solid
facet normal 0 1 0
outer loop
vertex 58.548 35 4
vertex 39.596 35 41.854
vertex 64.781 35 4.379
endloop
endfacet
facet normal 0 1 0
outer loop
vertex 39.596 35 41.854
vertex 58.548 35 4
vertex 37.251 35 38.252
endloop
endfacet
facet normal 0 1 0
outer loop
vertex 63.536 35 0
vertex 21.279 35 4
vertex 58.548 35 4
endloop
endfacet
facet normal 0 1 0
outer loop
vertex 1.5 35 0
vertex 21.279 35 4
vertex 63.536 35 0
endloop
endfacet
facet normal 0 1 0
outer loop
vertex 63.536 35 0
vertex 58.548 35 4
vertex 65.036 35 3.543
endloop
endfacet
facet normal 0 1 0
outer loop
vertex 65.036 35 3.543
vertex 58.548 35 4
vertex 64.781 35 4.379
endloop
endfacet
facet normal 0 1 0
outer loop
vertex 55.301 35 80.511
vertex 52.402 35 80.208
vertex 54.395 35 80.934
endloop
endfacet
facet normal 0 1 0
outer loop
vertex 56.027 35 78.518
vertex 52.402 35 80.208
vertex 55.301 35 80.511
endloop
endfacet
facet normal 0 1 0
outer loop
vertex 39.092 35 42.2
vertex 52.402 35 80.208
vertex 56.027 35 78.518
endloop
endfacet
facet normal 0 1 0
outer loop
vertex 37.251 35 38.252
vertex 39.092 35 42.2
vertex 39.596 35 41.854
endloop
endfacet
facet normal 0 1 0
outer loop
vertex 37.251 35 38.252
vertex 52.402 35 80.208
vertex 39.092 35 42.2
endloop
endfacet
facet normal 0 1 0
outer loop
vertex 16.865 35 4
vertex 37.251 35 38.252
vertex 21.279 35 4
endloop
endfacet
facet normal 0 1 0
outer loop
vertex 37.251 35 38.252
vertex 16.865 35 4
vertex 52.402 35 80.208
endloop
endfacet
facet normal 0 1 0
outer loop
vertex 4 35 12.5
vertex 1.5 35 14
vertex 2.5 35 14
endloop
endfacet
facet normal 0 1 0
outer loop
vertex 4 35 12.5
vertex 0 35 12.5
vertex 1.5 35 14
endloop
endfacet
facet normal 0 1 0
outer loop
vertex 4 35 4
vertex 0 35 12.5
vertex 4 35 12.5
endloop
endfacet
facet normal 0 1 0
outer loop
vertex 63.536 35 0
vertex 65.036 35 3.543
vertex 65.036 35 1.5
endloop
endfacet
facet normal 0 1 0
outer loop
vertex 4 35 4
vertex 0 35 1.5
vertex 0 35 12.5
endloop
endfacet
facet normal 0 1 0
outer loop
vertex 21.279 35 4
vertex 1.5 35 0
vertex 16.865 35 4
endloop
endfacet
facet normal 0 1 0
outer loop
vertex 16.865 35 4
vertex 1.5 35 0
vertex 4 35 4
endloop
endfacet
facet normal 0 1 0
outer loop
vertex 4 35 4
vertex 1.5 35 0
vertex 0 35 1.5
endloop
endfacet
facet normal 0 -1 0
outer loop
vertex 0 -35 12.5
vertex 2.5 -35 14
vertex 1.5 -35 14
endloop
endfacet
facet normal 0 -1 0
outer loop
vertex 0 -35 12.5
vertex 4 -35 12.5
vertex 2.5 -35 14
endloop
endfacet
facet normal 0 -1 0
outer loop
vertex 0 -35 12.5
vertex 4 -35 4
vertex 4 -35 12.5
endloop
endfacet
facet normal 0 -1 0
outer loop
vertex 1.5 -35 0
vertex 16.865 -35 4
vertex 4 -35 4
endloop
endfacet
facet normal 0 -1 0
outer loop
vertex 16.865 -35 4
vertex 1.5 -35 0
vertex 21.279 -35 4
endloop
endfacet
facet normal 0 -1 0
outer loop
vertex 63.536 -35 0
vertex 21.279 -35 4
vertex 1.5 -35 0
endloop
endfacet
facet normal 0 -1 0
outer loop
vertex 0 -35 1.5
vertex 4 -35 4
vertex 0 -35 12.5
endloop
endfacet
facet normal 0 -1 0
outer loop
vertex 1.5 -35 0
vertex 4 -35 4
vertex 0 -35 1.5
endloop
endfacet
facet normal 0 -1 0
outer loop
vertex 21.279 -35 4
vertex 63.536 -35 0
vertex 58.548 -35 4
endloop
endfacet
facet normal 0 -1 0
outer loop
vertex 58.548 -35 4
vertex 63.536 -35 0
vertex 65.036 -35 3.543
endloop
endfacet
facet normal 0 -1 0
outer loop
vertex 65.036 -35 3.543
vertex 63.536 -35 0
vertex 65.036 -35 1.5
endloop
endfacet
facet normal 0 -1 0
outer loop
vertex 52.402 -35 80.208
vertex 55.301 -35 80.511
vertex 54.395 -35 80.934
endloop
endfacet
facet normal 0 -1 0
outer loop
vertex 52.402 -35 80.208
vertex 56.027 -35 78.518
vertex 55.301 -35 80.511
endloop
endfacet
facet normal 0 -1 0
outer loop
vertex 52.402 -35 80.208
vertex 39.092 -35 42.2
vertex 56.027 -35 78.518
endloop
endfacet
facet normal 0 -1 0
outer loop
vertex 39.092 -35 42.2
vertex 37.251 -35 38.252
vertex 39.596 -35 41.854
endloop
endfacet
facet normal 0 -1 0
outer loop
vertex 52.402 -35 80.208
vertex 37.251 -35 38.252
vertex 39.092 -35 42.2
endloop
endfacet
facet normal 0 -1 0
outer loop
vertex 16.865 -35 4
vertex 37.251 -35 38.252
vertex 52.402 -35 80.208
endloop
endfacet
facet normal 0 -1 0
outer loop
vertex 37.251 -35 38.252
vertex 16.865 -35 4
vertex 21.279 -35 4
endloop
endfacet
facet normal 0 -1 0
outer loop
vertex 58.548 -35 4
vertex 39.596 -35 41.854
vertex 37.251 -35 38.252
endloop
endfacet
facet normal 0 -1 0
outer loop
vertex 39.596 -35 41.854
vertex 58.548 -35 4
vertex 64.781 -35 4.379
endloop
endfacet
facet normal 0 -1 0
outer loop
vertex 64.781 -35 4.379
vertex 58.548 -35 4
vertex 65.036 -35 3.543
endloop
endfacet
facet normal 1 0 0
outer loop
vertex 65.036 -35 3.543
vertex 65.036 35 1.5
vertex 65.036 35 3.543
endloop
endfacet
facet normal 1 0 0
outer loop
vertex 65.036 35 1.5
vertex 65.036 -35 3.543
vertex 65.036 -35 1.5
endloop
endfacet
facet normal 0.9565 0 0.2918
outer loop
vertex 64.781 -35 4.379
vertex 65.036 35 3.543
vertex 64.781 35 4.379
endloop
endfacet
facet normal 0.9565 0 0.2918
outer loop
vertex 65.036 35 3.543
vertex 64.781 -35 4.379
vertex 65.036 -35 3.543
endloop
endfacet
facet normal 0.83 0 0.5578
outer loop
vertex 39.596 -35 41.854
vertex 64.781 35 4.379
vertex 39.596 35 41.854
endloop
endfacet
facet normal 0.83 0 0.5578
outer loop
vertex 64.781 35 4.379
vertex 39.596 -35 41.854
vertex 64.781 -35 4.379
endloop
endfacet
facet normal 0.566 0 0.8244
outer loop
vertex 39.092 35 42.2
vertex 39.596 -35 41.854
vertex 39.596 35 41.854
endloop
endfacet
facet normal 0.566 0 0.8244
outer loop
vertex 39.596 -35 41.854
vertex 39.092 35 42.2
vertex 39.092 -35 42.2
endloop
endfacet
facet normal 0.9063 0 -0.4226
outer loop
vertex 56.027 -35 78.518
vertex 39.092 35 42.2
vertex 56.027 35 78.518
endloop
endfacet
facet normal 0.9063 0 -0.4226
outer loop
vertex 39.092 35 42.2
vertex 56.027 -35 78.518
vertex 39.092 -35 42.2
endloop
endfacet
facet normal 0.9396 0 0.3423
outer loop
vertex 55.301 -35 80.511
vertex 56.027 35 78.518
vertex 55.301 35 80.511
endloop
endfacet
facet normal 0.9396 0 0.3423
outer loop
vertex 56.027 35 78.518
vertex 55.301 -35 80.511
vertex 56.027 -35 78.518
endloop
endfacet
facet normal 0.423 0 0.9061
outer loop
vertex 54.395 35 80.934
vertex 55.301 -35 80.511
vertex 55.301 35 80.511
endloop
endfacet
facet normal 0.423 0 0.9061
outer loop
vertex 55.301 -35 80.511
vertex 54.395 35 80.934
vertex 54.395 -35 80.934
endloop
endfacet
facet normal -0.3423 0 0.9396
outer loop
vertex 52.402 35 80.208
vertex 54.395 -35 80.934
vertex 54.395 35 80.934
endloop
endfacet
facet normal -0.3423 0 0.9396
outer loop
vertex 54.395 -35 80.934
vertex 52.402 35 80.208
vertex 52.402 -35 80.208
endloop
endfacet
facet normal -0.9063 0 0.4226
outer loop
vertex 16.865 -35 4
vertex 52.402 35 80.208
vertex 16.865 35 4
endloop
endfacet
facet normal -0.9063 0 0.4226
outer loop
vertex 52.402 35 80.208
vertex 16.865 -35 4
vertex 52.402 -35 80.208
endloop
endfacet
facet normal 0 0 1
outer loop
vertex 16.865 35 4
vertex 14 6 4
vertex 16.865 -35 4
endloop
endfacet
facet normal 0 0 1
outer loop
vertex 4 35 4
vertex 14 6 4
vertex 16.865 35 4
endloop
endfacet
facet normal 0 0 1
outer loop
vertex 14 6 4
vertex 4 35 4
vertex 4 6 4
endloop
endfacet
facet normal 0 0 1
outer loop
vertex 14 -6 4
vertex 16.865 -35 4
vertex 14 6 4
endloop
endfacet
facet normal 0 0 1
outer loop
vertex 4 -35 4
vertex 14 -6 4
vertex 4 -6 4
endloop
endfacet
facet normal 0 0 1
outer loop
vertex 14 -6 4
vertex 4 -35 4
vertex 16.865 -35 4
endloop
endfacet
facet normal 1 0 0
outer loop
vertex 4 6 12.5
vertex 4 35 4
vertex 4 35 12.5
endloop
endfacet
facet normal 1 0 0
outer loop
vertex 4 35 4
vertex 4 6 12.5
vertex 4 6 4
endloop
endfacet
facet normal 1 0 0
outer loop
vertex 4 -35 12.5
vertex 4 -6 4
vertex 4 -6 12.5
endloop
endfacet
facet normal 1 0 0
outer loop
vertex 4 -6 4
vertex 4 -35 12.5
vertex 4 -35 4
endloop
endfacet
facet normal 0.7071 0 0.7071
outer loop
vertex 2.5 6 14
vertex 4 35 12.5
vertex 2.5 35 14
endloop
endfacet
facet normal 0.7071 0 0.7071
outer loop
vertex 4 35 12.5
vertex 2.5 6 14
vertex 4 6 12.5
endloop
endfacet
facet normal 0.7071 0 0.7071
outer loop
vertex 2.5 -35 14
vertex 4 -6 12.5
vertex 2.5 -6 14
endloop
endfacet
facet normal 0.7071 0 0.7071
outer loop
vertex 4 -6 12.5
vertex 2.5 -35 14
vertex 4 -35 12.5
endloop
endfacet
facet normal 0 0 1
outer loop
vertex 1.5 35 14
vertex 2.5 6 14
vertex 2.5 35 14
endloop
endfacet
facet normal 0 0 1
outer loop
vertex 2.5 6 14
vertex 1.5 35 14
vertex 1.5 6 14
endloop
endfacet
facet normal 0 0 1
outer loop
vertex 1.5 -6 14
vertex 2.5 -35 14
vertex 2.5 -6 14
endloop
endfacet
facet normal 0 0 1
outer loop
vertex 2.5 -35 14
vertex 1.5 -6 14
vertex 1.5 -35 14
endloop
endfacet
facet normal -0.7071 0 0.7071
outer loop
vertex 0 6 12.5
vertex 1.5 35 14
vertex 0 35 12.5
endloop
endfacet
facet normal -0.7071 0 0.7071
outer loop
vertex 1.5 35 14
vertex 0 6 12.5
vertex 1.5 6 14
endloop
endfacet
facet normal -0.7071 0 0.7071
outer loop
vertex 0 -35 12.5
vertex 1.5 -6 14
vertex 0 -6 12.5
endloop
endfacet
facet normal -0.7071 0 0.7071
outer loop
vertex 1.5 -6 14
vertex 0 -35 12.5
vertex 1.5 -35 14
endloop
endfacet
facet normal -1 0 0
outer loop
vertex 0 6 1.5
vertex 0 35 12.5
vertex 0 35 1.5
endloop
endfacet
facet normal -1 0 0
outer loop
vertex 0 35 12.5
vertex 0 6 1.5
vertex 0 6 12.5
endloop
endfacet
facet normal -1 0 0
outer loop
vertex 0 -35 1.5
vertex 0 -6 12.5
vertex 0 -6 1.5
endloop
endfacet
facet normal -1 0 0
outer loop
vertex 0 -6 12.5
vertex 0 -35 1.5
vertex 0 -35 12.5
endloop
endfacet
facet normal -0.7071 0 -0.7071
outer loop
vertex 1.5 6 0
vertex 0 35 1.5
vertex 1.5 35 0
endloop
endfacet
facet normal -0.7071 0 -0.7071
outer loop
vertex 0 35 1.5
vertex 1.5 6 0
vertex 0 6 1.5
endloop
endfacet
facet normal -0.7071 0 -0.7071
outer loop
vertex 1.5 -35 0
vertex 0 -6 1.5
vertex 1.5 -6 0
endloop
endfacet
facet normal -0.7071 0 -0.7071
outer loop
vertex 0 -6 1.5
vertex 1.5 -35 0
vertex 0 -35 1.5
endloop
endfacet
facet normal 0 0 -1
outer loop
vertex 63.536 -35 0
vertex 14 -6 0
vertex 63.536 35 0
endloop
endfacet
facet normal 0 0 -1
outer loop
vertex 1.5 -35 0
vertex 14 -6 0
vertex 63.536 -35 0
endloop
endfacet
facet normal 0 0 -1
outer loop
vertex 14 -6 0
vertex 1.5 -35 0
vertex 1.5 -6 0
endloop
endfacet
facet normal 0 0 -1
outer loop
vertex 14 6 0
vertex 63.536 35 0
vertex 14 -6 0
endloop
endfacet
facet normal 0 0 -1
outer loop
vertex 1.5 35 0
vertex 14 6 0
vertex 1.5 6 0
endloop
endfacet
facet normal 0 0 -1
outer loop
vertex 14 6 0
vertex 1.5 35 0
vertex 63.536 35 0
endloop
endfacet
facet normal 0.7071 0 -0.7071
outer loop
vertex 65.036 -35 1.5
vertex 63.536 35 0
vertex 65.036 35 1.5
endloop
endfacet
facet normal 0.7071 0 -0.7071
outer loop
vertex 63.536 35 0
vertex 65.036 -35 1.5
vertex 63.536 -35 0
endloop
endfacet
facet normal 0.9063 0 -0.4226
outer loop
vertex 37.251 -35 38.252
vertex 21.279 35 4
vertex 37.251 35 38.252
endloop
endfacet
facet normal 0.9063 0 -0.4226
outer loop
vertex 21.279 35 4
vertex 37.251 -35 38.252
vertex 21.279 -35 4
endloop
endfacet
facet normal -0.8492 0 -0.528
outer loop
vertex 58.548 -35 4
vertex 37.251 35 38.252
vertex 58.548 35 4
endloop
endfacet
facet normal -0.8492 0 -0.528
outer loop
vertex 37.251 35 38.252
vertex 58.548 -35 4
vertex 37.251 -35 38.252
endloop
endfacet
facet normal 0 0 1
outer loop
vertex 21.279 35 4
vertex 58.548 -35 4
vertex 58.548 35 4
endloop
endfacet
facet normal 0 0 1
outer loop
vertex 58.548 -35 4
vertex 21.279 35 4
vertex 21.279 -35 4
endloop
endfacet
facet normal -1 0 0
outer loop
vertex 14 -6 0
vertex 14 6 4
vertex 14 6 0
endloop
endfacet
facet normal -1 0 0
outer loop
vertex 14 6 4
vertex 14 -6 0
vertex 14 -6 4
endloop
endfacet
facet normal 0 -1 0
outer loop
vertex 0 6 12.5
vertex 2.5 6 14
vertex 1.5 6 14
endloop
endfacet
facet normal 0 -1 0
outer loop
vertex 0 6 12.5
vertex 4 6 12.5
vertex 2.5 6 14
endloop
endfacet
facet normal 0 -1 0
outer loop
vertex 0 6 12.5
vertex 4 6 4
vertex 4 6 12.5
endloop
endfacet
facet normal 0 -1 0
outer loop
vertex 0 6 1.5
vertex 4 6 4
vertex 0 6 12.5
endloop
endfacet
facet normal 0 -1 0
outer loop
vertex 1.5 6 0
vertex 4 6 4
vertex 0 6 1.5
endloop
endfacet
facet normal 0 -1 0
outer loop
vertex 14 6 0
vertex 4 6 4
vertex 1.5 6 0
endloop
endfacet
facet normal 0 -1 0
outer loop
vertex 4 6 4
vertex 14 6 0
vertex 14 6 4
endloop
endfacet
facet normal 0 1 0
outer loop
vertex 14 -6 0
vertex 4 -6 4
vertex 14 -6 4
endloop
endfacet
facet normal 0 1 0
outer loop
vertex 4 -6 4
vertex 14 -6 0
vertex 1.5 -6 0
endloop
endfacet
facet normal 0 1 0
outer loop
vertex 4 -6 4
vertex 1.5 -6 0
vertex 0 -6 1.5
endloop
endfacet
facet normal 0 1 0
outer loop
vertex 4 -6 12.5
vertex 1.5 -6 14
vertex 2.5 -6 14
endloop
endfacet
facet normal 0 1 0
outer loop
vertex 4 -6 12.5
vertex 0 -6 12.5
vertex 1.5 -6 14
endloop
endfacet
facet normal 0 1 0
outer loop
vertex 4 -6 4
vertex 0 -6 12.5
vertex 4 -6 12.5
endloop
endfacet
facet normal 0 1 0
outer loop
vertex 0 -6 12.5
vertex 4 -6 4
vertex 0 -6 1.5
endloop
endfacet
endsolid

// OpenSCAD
// Soporte para celular · Laboratorio Ayemi
// Medidas en mm. El Customizer vuelve
// controles los comentarios con [rango].
grosor_cel = 11;  // [6:0.5:16]
ancho = 70;       // [50:5:100]
angulo = 65;      // [50:5:80]
ranura_cable = true;

/* [Hidden] */
pared = 4;
alto = 90;        // largo del respaldo
labio = 14;       // tope del frente
x0 = pared + grosor_cel;
fondo = x0 + alto * cos(angulo) + 12;
ax = x0 + pared + alto * cos(angulo) / 2;
az = alto * sin(angulo) / 2;

module perfil() {
  intersection() {      // nada bajo el piso
    square([fondo, alto]);
    offset(r = 1.5) offset(delta = -1.5) {
      square([fondo, pared]);     // base
      square([pared, labio]);     // labio
      translate([x0, 0])          // respaldo
        rotate(angulo - 90)
          square([pared, alto]);
      hull() {                    // apoyo
        translate([ax, az]) circle(d = pared);
        translate([fondo - pared, 0])
          square(pared);
      }
    }
  }
}

difference() {
  rotate([90, 0, 0])
    linear_extrude(ancho, center = true)
      perfil();
  if (ranura_cable)              // cable
    translate([-1, -6, -1])
      cube([x0, 12, labio + 2]);
}
